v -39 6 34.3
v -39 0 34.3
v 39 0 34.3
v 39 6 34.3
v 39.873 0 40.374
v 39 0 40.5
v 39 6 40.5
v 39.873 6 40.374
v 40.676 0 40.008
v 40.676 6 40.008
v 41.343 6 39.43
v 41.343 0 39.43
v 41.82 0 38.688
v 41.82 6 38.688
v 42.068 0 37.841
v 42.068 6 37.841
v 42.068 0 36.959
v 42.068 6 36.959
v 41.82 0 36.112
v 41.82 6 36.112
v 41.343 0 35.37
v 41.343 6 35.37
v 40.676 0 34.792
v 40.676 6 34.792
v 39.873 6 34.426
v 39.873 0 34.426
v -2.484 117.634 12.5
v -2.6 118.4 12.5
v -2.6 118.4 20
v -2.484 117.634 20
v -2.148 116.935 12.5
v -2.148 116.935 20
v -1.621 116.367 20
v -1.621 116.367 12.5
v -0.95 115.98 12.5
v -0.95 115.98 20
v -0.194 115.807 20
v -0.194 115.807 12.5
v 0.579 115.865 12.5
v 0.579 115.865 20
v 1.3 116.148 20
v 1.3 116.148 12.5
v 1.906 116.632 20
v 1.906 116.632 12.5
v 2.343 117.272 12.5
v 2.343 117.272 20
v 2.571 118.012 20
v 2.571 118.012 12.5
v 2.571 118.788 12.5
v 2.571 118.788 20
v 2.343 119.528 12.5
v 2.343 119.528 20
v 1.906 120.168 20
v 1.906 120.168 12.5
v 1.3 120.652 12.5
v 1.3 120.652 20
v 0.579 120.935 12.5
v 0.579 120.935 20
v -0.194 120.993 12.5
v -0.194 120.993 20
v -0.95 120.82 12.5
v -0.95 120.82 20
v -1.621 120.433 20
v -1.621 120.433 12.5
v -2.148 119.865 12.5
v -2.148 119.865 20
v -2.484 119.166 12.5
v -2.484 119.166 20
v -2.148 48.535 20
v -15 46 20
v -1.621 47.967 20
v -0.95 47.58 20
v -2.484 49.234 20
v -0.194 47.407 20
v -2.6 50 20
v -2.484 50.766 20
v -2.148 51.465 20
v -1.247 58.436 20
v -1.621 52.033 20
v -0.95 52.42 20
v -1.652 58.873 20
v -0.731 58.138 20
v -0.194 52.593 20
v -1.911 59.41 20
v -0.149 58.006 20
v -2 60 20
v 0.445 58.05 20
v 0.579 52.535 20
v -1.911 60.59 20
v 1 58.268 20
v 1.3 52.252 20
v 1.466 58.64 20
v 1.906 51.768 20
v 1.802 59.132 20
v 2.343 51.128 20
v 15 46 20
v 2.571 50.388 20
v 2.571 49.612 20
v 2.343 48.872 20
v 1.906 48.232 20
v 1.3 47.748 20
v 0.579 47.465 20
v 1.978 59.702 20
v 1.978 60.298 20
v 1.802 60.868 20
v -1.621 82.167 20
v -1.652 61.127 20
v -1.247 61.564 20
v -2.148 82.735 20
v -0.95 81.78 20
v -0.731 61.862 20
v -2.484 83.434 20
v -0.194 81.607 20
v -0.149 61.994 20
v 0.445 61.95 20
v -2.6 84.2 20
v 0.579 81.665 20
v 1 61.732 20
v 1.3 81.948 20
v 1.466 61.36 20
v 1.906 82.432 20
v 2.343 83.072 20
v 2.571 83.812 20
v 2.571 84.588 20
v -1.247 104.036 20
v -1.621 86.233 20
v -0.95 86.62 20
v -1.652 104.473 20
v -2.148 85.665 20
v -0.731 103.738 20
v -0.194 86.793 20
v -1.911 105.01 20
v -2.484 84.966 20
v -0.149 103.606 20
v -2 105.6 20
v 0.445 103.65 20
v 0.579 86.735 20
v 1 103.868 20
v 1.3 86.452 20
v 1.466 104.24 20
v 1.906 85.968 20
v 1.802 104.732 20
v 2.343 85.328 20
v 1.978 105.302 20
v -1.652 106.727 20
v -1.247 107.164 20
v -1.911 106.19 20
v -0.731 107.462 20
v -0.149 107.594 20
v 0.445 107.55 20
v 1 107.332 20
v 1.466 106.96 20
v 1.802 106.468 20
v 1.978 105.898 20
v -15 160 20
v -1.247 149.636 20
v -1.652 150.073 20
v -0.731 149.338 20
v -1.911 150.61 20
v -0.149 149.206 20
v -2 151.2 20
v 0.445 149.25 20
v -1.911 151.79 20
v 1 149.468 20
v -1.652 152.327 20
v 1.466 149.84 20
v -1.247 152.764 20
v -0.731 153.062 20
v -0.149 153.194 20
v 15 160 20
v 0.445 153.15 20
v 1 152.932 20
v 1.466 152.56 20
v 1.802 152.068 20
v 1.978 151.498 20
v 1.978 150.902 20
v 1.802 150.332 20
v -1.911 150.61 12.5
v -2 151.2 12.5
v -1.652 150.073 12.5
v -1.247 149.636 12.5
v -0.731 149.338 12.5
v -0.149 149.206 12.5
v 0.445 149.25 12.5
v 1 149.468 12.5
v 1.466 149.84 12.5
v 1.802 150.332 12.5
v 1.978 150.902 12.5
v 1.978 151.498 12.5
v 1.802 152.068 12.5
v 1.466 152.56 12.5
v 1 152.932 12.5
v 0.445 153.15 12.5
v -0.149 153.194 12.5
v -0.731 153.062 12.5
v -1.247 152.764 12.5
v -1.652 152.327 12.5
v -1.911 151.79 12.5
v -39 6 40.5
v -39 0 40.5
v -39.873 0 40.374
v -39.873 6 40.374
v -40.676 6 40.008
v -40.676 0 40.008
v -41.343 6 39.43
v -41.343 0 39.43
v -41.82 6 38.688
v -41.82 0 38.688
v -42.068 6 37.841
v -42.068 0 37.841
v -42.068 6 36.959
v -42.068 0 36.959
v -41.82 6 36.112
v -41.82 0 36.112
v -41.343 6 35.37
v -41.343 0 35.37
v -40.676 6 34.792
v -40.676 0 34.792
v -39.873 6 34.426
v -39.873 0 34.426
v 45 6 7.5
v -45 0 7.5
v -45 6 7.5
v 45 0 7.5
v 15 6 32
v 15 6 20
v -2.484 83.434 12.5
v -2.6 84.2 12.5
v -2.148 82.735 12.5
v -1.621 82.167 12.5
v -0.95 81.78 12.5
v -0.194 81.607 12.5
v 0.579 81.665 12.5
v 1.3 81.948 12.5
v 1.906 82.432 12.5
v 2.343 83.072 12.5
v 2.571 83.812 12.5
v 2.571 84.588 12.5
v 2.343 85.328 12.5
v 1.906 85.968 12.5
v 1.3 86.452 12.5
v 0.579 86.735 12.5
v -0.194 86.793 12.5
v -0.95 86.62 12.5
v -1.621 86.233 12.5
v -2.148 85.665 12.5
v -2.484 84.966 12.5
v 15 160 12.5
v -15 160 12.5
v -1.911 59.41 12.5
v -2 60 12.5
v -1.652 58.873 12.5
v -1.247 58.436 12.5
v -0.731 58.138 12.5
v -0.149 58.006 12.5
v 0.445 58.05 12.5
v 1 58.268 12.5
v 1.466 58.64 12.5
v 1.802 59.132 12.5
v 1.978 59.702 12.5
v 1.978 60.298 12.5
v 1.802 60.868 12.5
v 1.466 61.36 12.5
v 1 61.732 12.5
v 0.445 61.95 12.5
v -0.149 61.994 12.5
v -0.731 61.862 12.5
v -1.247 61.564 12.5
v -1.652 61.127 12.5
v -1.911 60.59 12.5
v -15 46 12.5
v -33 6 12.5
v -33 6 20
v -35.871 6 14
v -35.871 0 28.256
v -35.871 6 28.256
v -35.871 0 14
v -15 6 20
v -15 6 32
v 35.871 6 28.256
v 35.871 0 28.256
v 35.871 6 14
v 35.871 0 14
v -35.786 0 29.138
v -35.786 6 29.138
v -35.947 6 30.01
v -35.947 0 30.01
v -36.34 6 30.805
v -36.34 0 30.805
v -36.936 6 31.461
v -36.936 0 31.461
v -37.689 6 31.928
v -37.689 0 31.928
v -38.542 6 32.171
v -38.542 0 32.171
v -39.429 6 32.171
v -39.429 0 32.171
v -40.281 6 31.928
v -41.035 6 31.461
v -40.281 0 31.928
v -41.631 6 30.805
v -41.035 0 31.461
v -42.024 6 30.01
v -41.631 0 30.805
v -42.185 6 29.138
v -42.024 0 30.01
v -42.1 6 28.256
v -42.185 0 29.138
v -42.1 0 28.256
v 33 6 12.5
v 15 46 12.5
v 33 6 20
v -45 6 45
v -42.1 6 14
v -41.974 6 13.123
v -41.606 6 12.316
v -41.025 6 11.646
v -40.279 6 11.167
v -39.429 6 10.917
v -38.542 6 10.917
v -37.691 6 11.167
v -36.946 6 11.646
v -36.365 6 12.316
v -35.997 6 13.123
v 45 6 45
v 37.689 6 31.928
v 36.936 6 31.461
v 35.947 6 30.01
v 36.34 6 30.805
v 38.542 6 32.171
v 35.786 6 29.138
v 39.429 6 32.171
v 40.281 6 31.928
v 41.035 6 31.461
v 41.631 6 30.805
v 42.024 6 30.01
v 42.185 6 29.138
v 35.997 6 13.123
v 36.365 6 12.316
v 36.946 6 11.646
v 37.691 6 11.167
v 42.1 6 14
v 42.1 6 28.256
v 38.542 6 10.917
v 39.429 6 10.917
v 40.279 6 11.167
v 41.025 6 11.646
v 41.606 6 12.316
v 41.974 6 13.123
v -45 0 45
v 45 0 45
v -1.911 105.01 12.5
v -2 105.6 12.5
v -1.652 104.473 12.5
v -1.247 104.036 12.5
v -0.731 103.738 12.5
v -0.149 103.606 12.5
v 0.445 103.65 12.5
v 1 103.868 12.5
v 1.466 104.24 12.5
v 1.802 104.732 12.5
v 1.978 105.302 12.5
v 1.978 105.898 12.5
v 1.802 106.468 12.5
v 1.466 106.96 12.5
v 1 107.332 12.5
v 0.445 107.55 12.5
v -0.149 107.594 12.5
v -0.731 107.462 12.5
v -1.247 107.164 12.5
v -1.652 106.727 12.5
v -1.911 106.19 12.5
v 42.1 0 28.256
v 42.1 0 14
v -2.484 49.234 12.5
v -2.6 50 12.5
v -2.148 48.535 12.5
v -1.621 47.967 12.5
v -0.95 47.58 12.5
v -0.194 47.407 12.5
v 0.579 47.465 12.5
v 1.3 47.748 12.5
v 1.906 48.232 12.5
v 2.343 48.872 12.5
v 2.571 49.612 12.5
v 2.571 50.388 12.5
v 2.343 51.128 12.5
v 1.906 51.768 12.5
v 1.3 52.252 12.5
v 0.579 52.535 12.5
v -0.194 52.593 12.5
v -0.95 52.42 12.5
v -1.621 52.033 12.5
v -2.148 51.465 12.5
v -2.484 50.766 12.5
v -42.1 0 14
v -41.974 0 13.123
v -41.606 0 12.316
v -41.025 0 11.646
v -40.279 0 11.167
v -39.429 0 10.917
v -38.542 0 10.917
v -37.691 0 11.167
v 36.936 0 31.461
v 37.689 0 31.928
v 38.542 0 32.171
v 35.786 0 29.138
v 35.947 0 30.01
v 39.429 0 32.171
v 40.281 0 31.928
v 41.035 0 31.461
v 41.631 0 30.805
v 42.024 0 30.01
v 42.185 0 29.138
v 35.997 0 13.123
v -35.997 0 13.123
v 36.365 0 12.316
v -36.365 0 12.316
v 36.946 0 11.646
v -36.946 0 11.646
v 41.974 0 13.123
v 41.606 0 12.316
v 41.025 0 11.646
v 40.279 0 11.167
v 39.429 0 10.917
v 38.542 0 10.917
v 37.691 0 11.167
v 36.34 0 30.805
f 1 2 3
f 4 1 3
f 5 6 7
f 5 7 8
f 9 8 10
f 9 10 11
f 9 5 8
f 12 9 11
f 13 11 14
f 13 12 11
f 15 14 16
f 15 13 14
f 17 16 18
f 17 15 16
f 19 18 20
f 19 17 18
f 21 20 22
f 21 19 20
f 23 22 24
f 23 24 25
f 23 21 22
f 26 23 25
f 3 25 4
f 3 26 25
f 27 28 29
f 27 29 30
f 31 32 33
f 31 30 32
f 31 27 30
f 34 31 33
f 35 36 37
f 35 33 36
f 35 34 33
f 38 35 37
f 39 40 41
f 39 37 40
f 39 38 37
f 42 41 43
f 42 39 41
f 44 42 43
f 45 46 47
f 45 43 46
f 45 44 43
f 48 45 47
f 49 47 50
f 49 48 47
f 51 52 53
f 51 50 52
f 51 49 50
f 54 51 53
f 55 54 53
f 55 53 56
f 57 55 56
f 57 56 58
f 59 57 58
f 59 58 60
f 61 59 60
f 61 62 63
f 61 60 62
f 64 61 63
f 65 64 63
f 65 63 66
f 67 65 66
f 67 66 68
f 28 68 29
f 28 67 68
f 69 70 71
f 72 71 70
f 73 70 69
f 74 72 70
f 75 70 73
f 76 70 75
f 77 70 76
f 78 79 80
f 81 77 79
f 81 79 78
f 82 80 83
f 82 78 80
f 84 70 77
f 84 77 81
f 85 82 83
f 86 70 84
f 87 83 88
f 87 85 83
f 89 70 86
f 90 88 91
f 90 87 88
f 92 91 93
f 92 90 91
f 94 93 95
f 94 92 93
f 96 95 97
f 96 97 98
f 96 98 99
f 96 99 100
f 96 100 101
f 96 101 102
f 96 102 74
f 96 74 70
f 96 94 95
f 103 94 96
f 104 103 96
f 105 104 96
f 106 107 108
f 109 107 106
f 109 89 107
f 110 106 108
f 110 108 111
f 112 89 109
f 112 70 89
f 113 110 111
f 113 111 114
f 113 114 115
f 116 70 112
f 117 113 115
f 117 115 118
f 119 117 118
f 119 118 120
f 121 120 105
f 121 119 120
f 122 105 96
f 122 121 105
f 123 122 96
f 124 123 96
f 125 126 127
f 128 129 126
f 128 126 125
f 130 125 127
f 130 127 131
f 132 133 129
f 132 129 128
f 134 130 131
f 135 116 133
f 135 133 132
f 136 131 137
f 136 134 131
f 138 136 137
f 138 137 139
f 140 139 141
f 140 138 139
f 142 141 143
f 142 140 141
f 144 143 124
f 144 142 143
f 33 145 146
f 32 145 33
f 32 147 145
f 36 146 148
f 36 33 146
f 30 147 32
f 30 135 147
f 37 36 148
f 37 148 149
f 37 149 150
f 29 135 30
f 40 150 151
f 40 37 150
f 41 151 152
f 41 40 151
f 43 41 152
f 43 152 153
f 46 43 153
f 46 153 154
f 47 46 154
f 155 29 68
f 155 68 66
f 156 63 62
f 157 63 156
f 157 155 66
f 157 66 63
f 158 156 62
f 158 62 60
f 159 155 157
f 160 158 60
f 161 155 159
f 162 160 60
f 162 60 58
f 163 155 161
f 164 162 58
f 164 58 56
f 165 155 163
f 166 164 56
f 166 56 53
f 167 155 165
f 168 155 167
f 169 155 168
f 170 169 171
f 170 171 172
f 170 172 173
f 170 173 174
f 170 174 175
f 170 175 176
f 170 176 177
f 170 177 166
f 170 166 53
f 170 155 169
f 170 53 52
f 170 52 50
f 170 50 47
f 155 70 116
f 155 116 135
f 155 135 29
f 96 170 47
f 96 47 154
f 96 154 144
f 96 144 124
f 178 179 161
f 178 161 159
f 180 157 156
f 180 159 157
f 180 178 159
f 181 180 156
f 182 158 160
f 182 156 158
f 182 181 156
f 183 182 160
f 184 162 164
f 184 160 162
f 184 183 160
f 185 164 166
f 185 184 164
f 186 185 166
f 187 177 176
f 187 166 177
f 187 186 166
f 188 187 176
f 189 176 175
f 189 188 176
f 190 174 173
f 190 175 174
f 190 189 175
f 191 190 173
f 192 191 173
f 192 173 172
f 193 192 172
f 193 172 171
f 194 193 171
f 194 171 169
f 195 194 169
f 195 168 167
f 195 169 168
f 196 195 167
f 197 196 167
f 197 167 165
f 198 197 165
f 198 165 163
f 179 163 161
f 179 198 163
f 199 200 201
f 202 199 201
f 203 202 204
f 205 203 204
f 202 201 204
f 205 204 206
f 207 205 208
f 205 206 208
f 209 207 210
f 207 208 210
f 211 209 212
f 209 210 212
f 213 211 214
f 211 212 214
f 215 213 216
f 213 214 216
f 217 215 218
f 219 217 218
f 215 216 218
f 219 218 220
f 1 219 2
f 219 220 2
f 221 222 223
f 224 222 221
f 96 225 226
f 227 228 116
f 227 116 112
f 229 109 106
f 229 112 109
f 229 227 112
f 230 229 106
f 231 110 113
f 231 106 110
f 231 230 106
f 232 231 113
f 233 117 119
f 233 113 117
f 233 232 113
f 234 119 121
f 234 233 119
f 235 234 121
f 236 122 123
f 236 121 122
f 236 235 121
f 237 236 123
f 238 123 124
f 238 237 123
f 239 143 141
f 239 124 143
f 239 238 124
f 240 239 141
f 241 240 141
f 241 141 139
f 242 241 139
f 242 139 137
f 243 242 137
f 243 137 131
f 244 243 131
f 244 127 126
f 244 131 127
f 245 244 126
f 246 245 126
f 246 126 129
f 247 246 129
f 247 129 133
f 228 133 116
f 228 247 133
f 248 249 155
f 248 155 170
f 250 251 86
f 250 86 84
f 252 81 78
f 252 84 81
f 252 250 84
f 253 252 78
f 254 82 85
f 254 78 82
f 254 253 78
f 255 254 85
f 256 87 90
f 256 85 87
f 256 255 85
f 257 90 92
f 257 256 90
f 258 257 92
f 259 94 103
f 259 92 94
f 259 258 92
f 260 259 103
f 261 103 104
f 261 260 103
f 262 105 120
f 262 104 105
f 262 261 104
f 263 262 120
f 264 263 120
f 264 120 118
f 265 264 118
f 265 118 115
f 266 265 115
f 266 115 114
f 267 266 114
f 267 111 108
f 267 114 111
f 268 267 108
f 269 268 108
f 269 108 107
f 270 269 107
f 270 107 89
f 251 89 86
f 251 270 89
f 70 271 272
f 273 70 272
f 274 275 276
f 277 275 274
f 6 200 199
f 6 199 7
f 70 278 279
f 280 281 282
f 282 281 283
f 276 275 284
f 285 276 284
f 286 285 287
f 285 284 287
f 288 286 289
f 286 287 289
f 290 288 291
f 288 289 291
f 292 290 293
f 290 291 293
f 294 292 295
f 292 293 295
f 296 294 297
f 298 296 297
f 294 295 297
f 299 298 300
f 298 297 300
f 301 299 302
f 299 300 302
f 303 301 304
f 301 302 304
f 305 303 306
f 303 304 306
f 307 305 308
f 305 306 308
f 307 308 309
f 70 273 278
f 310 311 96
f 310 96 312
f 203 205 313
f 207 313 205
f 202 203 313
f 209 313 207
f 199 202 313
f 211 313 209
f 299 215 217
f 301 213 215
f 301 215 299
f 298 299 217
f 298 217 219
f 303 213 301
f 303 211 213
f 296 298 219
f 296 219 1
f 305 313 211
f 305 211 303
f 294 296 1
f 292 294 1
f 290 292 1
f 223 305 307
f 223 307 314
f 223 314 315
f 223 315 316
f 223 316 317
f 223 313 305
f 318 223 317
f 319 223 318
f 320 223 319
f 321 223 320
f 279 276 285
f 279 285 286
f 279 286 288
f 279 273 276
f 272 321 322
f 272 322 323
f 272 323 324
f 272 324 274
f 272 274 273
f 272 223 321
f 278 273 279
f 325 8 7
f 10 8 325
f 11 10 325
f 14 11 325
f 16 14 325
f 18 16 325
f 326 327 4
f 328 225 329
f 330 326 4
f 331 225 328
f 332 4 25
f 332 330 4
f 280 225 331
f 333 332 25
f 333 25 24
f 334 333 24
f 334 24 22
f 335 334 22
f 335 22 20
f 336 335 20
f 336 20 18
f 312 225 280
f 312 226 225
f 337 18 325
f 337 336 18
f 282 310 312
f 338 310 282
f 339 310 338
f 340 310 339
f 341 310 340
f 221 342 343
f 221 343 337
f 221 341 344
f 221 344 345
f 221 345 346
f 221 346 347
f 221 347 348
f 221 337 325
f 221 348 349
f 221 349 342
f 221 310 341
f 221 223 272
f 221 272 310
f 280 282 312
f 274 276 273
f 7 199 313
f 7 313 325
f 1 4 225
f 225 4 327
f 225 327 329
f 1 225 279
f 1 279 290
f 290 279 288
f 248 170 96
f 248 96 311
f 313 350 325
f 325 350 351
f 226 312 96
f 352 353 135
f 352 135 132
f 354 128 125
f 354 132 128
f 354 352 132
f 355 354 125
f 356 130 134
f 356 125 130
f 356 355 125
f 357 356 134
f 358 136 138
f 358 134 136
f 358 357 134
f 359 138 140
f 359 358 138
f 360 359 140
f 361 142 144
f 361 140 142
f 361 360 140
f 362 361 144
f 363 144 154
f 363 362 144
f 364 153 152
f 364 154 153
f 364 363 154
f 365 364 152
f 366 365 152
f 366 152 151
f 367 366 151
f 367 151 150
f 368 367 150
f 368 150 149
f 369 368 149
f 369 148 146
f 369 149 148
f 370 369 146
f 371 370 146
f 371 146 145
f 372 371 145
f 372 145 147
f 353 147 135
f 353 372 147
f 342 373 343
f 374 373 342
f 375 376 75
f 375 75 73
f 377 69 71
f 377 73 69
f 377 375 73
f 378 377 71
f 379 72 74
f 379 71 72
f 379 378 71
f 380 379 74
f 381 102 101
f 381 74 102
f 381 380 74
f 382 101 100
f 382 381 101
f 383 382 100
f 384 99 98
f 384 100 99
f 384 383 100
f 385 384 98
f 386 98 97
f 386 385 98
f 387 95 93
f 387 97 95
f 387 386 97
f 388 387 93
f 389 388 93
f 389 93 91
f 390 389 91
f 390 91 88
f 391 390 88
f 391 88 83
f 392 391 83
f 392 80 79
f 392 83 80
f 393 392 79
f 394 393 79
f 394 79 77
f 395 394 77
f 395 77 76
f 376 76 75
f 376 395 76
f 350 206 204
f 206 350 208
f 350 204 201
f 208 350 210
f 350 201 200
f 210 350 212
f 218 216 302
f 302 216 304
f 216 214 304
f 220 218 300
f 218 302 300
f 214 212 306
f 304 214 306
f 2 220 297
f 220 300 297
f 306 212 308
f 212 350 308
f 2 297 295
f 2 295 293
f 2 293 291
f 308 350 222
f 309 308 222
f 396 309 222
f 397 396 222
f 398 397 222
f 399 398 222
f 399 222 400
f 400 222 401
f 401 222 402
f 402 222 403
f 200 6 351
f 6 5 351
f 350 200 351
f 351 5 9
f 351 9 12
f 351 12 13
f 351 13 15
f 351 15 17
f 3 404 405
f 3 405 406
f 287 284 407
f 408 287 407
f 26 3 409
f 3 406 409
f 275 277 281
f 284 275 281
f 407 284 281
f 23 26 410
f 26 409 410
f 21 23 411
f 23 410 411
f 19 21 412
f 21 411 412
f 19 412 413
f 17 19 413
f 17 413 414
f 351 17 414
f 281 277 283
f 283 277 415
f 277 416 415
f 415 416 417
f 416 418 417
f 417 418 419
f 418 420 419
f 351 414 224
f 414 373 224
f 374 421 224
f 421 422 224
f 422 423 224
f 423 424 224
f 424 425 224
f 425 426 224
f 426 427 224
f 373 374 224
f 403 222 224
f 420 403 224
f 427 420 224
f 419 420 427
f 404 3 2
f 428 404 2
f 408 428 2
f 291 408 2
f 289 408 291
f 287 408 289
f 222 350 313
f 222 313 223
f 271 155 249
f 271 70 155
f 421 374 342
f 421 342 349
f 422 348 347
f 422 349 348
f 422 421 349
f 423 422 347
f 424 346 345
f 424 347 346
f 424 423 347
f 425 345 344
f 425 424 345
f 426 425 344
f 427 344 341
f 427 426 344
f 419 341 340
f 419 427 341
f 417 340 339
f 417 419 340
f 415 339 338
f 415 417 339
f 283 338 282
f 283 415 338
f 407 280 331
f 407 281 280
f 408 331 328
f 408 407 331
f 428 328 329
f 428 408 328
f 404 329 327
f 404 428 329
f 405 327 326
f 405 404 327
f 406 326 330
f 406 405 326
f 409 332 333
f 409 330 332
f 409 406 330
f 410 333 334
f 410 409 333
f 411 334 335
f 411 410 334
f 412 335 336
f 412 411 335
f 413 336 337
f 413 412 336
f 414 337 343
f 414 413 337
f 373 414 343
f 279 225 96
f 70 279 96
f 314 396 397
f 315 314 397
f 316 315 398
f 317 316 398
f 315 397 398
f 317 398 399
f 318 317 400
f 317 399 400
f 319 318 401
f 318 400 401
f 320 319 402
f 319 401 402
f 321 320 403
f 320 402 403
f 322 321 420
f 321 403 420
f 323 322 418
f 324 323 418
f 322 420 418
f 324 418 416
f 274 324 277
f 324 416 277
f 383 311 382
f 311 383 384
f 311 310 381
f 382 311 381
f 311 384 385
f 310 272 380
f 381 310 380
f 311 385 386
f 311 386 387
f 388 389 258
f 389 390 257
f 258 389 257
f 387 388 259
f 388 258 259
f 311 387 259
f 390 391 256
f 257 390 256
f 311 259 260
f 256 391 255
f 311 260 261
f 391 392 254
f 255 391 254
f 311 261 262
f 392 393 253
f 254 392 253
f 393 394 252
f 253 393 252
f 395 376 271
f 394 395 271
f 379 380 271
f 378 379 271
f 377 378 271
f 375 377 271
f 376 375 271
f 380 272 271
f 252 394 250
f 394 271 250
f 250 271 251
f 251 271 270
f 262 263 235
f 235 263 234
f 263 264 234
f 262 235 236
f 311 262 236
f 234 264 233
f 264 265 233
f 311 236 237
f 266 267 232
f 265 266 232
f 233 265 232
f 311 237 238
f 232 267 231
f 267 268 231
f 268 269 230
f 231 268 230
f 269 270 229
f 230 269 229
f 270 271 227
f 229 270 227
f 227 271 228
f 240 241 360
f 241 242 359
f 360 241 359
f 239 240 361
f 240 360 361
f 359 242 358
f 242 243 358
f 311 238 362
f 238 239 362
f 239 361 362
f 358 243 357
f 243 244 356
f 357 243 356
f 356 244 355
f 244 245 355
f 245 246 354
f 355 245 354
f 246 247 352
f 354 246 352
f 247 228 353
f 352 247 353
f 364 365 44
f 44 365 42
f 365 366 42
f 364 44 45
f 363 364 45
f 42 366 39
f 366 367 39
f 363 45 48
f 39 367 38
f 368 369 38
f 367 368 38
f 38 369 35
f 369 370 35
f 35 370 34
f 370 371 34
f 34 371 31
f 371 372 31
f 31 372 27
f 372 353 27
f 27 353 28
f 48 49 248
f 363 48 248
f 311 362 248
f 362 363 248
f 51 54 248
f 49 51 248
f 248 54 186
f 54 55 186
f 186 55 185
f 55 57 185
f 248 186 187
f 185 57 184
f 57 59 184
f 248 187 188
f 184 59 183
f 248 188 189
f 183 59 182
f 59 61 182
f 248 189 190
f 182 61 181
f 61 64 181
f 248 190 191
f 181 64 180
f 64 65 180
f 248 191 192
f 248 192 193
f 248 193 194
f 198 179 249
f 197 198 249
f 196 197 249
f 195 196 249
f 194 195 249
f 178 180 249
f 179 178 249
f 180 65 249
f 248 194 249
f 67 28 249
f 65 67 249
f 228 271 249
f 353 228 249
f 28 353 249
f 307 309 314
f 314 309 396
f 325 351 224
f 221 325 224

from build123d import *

# Parameters (mm, degrees)
SKETCH_1_W                = 90
SKETCH_1_H                = 90
EXTRUDE_1_DEPTH           = 6
SKETCH_2_W                = 30
SKETCH_2_H                = 40
EXTRUDE_2_DEPTH           = 160
EXTRUDE_3_DEPTH           = 20
SKETCH_8_R                = 3.1
CUT_EXTRUDE_2_DEPTH       = 6
EXTRUDE_4_DEPTH           = 15
CUT_EXTRUDE_4_DEPTH       = 173.191753577
CUT_EXTRUDE_4_DEPTH_BACK  = 173.191753577
SKETCH_17_W               = 25
SKETCH_17_H               = 154
SKETCH_21_W               = 15
SKETCH_21_H               = 6
CUT_EXTRUDE_8_DEPTH       = 173.191753577
SKETCH_23_W               = 78
SKETCH_23_H               = 6.2
CUT_EXTRUDE_9_DEPTH       = 173.191753577
MIRROR_14_COPY_1_SKETCH_R = 3.1
MIRROR_14_COPY_1_DEPTH    = 6
SKETCH_25_W               = 6.229282002
SKETCH_25_H               = 15
CUT_EXTRUDE_10_DEPTH      = 173.191753577
SKETCH_26_R               = 3.114641001
CUT_EXTRUDE_11_DEPTH      = 173.191753577
SKETCH_27_R               = 3.202321727
CUT_EXTRUDE_12_DEPTH      = 173.191753577
CUT_EXTRUDE_13_DEPTH      = 173.191753577
SKETCH_29_W               = 45
SKETCH_29_H               = 7.5
CUT_EXTRUDE_14_DEPTH      = 173.191753577
SKETCH_30_W               = 5
SKETCH_30_H               = 40
CUT_EXTRUDE_15_DEPTH      = 173.191753577
SKETCH_31_R               = 2
CUT_EXTRUDE_16_DEPTH      = 173.191753577
PATTERN_LINEAR_2_COUNT    = 3
PATTERN_LINEAR_2_PITCH    = 45.6
SKETCH_32_R               = 2.6
CUT_EXTRUDE_17_DEPTH      = 173.191753577
PATTERN_LINEAR_3_COUNT    = 3
PATTERN_LINEAR_3_PITCH    = 34.2


with BuildPart() as part:
    # 草图1 → 凸台-拉伸1 (new body)
    with BuildSketch(Plane(origin=(0, 0, 0), x_dir=(1, 0, 0), z_dir=(0, 1, 0))):
        Rectangle(SKETCH_1_W, SKETCH_1_H)
    extrude(amount=EXTRUDE_1_DEPTH)

    # 草图2 → 凸台-拉伸2 (add)
    with BuildSketch(Plane(origin=(0, 0, 0), x_dir=(1, 0, 0), z_dir=(0, 1, 0))):
        Rectangle(SKETCH_2_W, SKETCH_2_H)
    extrude(amount=EXTRUDE_2_DEPTH)

    # 草图7 → 凸台-拉伸3 (add)
    with BuildSketch(Plane.XY):
        Polygon((-15, 46), (-33, 6), (-15, 6), align=None)
    extrude_3 = extrude(amount=EXTRUDE_3_DEPTH)

    # 草图8 → 切除-拉伸2 (cut)
    with BuildSketch(Plane(origin=(0, 0, 0), x_dir=(1, 0, 0), z_dir=(0, 1, 0))):
        with Locations(Location((-39, 37.4, 0), (0, 0, 90))):
            Circle(SKETCH_8_R)
    cut_extrude_2 = extrude(amount=CUT_EXTRUDE_2_DEPTH, mode=Mode.SUBTRACT)

    # 草图15 → 凸台-拉伸4 (add, symmetric)
    with BuildSketch(Plane(origin=(0, 0, 0), x_dir=(0, 0, -1), z_dir=(1, 0, 0))):
        Polygon((-20, 46), (-20, 6), (-32, 6), align=None)
    extrude_4 = extrude(amount=EXTRUDE_4_DEPTH, both=True)

    # 镜向11: 凸台-拉伸4 across plane
    add(extrude_4.mirror(Plane.XY))

    # 草图17 → 切除-拉伸4 (cut, two sides: drawn at the far end of the back side and taken through both)
    with BuildSketch(Plane(origin=(0, 0, 0), x_dir=(0, 0, -1), z_dir=(1, 0, 0)).offset(-CUT_EXTRUDE_4_DEPTH_BACK)):
        with Locations((0, 83)):
            Rectangle(SKETCH_17_W, SKETCH_17_H)
    extrude(amount=CUT_EXTRUDE_4_DEPTH + CUT_EXTRUDE_4_DEPTH_BACK, mode=Mode.SUBTRACT)

    # 草图21 → 切除-拉伸8 (cut, through all)
    with BuildSketch(Plane(origin=(0, 0, 0), x_dir=(0, 0, -1), z_dir=(1, 0, 0))):
        with Locations((0, 3)):
            Rectangle(SKETCH_21_W, SKETCH_21_H)
    extrude(amount=-CUT_EXTRUDE_8_DEPTH, mode=Mode.SUBTRACT)

    # 镜向12: 切除-拉伸2 across plane
    add(cut_extrude_2.mirror(Plane(origin=(0, 0, 0), x_dir=(0, 0, 1), z_dir=(1, 0, 0))), mode=Mode.SUBTRACT)

    # 草图23 → 切除-拉伸9 (cut, through all)
    with BuildSketch(Plane(origin=(0, 0, 0), x_dir=(1, 0, 0), z_dir=(0, 1, 0))):
        with Locations((0, 37.4)):
            Rectangle(SKETCH_23_W, SKETCH_23_H)
    cut_extrude_9 = extrude(amount=CUT_EXTRUDE_9_DEPTH, mode=Mode.SUBTRACT)

    # 镜向13: 切除-拉伸9 across plane
    add(cut_extrude_9.mirror(Plane.XY), mode=Mode.SUBTRACT)

    # 镜向14: 切除-拉伸2 across plane
    add(cut_extrude_2.mirror(Plane.XY), mode=Mode.SUBTRACT)

    # 镜向14 copy 1 sketch → 镜向14 copy 1 (cut)
    with BuildSketch(Plane(origin=(0, 0, 0), x_dir=(-1, 0, 0), z_dir=(0, 1, 0))):
        with Locations(Location((-39, 37.4, 0), (0, 0, 90))):
            Circle(MIRROR_14_COPY_1_SKETCH_R)
    extrude(amount=MIRROR_14_COPY_1_DEPTH, mode=Mode.SUBTRACT)

    # 草图25 → 切除-拉伸10 (cut, through all)
    with BuildSketch(Plane(origin=(0, 0, 0), x_dir=(1, 0, 0), z_dir=(0, 1, 0))):
        with Locations((38.985358999, -21.5)):
            Rectangle(SKETCH_25_W, SKETCH_25_H)
    cut_extrude_10 = extrude(amount=CUT_EXTRUDE_10_DEPTH, mode=Mode.SUBTRACT)

    # 草图26 → 切除-拉伸11 (cut, through all)
    with BuildSketch(Plane(origin=(0, 0, 0), x_dir=(1, 0, 0), z_dir=(0, 1, 0))):
        with Locations((38.985358999, -14)):
            Circle(SKETCH_26_R)
    cut_extrude_11 = extrude(amount=CUT_EXTRUDE_11_DEPTH, mode=Mode.SUBTRACT)

    # 草图27 → 切除-拉伸12 (cut, through all)
    with BuildSketch(Plane(origin=(0, 0, 0), x_dir=(1, 0, 0), z_dir=(0, 1, 0))):
        with Locations((38.985358999, -29)):
            Circle(SKETCH_27_R)
    cut_extrude_12 = extrude(amount=CUT_EXTRUDE_12_DEPTH, mode=Mode.SUBTRACT)

    # 镜向15: 切除-拉伸10 across plane
    add(cut_extrude_10.mirror(Plane(origin=(0, 0, 0), x_dir=(0, 0, 1), z_dir=(1, 0, 0))), mode=Mode.SUBTRACT)

    # 镜向16: 切除-拉伸11 across plane
    add(cut_extrude_11.mirror(Plane(origin=(0, 0, 0), x_dir=(0, 0, 1), z_dir=(1, 0, 0))), mode=Mode.SUBTRACT)

    # 镜向17: 切除-拉伸12 across plane
    add(cut_extrude_12.mirror(Plane(origin=(0, 0, 0), x_dir=(0, 0, 1), z_dir=(1, 0, 0))), mode=Mode.SUBTRACT)

    # 镜向23: 凸台-拉伸3 across plane
    add(extrude_3.mirror(Plane(origin=(0, 0, 0), x_dir=(0, 0, 1), z_dir=(1, 0, 0))))

    # 草图28 → 切除-拉伸13 (cut, through all)
    with BuildSketch(Plane(origin=(0, 0, 0), x_dir=(1, 0, 0), z_dir=(0, 1, 0))):
        Polygon((45, 0), (0, 0), (0, 7.5), (-45, 7.5), (-45, 45), (45, 45), align=None)
    extrude(amount=CUT_EXTRUDE_13_DEPTH, mode=Mode.SUBTRACT)

    # 草图29 → 切除-拉伸14 (cut, through all)
    with BuildSketch(Plane(origin=(0, 0, 0), x_dir=(1, 0, 0), z_dir=(0, 1, 0))):
        with Locations((22.5, -3.75)):
            Rectangle(SKETCH_29_W, SKETCH_29_H)
    extrude(amount=CUT_EXTRUDE_14_DEPTH, mode=Mode.SUBTRACT)

    # 草图30 → 切除-拉伸15 (cut, through all)
    with BuildSketch(Plane(origin=(0, 0, 0), x_dir=(0, 0, -1), z_dir=(1, 0, 0))):
        with Locations((-10, 26)):
            Rectangle(SKETCH_30_W, SKETCH_30_H)
    extrude(amount=CUT_EXTRUDE_15_DEPTH, mode=Mode.SUBTRACT)

    # 草图31 → 切除-拉伸16 (cut, through all)
    with BuildSketch(Plane.XY):
        with Locations(Location((0, 60, 0), (0, 0, 180))):
            Circle(SKETCH_31_R)
    cut_extrude_16 = extrude(amount=CUT_EXTRUDE_16_DEPTH, mode=Mode.SUBTRACT)

    # 阵列(线性)2: 切除-拉伸16 ×3
    with Locations(*[(0, i * PATTERN_LINEAR_2_PITCH, 0) for i in range(1, PATTERN_LINEAR_2_COUNT)]):
        add(cut_extrude_16, mode=Mode.SUBTRACT)

    # 草图32 → 切除-拉伸17 (cut, through all)
    with BuildSketch(Plane.XY):
        with Locations(Location((0, 50, 0), (0, 0, 180))):
            Circle(SKETCH_32_R)
    cut_extrude_17 = extrude(amount=CUT_EXTRUDE_17_DEPTH, mode=Mode.SUBTRACT)

    # 阵列(线性)3: 切除-拉伸17 ×3
    with Locations(*[(0, i * PATTERN_LINEAR_3_PITCH, 0) for i in range(1, PATTERN_LINEAR_3_COUNT)]):
        add(cut_extrude_17, mode=Mode.SUBTRACT)


solid = part.part
